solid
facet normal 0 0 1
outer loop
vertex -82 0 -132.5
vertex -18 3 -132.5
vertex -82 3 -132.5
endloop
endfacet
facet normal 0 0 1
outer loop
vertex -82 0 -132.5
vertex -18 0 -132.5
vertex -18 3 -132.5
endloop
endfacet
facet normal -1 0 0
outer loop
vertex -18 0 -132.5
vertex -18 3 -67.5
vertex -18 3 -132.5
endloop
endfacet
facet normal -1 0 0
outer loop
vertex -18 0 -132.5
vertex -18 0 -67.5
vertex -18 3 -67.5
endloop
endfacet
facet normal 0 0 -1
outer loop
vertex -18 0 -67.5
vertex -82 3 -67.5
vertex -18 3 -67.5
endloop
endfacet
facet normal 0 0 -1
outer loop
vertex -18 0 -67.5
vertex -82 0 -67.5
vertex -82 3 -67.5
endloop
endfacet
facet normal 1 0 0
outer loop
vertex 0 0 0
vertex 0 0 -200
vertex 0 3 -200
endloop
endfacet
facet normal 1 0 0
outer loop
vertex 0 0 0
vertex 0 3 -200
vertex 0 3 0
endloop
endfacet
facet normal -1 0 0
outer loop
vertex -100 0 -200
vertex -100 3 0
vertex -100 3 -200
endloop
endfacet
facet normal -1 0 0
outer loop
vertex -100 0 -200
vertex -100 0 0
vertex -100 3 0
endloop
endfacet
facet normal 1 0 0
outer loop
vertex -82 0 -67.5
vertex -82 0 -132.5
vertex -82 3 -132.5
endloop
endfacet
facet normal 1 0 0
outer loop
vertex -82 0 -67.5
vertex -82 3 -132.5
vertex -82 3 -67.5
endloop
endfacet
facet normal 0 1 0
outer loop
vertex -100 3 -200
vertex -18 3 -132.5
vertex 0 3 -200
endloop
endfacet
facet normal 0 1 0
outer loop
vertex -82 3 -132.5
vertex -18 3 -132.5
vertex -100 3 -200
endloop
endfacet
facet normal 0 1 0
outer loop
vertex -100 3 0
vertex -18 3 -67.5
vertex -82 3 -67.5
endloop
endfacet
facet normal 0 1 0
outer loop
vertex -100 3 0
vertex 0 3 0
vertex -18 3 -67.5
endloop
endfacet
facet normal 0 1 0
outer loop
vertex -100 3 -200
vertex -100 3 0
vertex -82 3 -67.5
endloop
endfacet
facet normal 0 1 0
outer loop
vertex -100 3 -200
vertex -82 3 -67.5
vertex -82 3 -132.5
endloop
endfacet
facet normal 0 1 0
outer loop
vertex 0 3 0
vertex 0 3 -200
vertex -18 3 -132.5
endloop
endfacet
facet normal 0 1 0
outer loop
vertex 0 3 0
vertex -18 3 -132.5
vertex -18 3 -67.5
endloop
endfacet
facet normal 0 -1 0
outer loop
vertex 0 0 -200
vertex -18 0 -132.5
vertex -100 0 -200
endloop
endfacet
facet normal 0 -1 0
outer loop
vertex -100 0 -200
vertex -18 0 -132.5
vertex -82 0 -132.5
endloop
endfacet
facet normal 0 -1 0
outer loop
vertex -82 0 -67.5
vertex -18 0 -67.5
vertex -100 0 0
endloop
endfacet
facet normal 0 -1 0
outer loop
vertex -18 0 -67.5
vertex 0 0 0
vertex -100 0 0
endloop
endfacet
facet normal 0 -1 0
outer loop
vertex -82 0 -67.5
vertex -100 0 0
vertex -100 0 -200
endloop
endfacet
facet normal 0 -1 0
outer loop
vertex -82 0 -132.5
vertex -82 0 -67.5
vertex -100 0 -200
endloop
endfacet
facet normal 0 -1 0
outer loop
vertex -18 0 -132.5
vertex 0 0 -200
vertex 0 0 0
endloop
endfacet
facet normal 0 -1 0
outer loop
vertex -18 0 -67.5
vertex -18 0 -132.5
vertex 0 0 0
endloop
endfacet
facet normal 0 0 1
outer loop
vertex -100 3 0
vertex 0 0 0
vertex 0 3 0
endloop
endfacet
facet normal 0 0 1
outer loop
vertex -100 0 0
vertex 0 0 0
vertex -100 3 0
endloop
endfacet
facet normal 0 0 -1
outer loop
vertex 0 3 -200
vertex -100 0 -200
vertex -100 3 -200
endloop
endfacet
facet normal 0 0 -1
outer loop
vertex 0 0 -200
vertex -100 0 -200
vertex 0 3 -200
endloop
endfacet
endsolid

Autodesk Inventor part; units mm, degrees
ref_plane "YZ Plane" through (0, 0, 0) normal (1, 0, 0) x (0, 1, 0)
ref_plane "XZ Plane" through (0, 0, 0) normal (0, 1, 0) x (-1, 0, 0)
ref_plane "XY Plane" through (0, 0, 0) normal (0, 0, 1) x (1, 0, 0)
sketch "Sketch1" plane through (0, 0, 0) normal (0, 1, 0) x (-1, 0, 0)
  line L0 (0, 0) -> (100, 0)
  line L1 (100, 0) -> (100, -200)
  line L2 (100, -200) -> (0, -200)
  line L3 (0, -200) -> (0, 0)
  line L4 (82, -67.5) -> (18, -67.5)
  line L5 (18, -67.5) -> (18, -132.5)
  line L6 (18, -132.5) -> (82, -132.5)
  line L7 (82, -132.5) -> (82, -67.5)
  point P0 (100, -100)
  dimension "d0" = 200
  dimension "d1" = 100
  dimension "d2" = 65
  dimension "d3" = 64
  dimension "d4" = 18
  dimension "d5" = 67.5
extrude "Extrusion1" add sketch "Sketch1" along normal blind 3
properties part number "Q top1 new" material "ABS Plastic"
